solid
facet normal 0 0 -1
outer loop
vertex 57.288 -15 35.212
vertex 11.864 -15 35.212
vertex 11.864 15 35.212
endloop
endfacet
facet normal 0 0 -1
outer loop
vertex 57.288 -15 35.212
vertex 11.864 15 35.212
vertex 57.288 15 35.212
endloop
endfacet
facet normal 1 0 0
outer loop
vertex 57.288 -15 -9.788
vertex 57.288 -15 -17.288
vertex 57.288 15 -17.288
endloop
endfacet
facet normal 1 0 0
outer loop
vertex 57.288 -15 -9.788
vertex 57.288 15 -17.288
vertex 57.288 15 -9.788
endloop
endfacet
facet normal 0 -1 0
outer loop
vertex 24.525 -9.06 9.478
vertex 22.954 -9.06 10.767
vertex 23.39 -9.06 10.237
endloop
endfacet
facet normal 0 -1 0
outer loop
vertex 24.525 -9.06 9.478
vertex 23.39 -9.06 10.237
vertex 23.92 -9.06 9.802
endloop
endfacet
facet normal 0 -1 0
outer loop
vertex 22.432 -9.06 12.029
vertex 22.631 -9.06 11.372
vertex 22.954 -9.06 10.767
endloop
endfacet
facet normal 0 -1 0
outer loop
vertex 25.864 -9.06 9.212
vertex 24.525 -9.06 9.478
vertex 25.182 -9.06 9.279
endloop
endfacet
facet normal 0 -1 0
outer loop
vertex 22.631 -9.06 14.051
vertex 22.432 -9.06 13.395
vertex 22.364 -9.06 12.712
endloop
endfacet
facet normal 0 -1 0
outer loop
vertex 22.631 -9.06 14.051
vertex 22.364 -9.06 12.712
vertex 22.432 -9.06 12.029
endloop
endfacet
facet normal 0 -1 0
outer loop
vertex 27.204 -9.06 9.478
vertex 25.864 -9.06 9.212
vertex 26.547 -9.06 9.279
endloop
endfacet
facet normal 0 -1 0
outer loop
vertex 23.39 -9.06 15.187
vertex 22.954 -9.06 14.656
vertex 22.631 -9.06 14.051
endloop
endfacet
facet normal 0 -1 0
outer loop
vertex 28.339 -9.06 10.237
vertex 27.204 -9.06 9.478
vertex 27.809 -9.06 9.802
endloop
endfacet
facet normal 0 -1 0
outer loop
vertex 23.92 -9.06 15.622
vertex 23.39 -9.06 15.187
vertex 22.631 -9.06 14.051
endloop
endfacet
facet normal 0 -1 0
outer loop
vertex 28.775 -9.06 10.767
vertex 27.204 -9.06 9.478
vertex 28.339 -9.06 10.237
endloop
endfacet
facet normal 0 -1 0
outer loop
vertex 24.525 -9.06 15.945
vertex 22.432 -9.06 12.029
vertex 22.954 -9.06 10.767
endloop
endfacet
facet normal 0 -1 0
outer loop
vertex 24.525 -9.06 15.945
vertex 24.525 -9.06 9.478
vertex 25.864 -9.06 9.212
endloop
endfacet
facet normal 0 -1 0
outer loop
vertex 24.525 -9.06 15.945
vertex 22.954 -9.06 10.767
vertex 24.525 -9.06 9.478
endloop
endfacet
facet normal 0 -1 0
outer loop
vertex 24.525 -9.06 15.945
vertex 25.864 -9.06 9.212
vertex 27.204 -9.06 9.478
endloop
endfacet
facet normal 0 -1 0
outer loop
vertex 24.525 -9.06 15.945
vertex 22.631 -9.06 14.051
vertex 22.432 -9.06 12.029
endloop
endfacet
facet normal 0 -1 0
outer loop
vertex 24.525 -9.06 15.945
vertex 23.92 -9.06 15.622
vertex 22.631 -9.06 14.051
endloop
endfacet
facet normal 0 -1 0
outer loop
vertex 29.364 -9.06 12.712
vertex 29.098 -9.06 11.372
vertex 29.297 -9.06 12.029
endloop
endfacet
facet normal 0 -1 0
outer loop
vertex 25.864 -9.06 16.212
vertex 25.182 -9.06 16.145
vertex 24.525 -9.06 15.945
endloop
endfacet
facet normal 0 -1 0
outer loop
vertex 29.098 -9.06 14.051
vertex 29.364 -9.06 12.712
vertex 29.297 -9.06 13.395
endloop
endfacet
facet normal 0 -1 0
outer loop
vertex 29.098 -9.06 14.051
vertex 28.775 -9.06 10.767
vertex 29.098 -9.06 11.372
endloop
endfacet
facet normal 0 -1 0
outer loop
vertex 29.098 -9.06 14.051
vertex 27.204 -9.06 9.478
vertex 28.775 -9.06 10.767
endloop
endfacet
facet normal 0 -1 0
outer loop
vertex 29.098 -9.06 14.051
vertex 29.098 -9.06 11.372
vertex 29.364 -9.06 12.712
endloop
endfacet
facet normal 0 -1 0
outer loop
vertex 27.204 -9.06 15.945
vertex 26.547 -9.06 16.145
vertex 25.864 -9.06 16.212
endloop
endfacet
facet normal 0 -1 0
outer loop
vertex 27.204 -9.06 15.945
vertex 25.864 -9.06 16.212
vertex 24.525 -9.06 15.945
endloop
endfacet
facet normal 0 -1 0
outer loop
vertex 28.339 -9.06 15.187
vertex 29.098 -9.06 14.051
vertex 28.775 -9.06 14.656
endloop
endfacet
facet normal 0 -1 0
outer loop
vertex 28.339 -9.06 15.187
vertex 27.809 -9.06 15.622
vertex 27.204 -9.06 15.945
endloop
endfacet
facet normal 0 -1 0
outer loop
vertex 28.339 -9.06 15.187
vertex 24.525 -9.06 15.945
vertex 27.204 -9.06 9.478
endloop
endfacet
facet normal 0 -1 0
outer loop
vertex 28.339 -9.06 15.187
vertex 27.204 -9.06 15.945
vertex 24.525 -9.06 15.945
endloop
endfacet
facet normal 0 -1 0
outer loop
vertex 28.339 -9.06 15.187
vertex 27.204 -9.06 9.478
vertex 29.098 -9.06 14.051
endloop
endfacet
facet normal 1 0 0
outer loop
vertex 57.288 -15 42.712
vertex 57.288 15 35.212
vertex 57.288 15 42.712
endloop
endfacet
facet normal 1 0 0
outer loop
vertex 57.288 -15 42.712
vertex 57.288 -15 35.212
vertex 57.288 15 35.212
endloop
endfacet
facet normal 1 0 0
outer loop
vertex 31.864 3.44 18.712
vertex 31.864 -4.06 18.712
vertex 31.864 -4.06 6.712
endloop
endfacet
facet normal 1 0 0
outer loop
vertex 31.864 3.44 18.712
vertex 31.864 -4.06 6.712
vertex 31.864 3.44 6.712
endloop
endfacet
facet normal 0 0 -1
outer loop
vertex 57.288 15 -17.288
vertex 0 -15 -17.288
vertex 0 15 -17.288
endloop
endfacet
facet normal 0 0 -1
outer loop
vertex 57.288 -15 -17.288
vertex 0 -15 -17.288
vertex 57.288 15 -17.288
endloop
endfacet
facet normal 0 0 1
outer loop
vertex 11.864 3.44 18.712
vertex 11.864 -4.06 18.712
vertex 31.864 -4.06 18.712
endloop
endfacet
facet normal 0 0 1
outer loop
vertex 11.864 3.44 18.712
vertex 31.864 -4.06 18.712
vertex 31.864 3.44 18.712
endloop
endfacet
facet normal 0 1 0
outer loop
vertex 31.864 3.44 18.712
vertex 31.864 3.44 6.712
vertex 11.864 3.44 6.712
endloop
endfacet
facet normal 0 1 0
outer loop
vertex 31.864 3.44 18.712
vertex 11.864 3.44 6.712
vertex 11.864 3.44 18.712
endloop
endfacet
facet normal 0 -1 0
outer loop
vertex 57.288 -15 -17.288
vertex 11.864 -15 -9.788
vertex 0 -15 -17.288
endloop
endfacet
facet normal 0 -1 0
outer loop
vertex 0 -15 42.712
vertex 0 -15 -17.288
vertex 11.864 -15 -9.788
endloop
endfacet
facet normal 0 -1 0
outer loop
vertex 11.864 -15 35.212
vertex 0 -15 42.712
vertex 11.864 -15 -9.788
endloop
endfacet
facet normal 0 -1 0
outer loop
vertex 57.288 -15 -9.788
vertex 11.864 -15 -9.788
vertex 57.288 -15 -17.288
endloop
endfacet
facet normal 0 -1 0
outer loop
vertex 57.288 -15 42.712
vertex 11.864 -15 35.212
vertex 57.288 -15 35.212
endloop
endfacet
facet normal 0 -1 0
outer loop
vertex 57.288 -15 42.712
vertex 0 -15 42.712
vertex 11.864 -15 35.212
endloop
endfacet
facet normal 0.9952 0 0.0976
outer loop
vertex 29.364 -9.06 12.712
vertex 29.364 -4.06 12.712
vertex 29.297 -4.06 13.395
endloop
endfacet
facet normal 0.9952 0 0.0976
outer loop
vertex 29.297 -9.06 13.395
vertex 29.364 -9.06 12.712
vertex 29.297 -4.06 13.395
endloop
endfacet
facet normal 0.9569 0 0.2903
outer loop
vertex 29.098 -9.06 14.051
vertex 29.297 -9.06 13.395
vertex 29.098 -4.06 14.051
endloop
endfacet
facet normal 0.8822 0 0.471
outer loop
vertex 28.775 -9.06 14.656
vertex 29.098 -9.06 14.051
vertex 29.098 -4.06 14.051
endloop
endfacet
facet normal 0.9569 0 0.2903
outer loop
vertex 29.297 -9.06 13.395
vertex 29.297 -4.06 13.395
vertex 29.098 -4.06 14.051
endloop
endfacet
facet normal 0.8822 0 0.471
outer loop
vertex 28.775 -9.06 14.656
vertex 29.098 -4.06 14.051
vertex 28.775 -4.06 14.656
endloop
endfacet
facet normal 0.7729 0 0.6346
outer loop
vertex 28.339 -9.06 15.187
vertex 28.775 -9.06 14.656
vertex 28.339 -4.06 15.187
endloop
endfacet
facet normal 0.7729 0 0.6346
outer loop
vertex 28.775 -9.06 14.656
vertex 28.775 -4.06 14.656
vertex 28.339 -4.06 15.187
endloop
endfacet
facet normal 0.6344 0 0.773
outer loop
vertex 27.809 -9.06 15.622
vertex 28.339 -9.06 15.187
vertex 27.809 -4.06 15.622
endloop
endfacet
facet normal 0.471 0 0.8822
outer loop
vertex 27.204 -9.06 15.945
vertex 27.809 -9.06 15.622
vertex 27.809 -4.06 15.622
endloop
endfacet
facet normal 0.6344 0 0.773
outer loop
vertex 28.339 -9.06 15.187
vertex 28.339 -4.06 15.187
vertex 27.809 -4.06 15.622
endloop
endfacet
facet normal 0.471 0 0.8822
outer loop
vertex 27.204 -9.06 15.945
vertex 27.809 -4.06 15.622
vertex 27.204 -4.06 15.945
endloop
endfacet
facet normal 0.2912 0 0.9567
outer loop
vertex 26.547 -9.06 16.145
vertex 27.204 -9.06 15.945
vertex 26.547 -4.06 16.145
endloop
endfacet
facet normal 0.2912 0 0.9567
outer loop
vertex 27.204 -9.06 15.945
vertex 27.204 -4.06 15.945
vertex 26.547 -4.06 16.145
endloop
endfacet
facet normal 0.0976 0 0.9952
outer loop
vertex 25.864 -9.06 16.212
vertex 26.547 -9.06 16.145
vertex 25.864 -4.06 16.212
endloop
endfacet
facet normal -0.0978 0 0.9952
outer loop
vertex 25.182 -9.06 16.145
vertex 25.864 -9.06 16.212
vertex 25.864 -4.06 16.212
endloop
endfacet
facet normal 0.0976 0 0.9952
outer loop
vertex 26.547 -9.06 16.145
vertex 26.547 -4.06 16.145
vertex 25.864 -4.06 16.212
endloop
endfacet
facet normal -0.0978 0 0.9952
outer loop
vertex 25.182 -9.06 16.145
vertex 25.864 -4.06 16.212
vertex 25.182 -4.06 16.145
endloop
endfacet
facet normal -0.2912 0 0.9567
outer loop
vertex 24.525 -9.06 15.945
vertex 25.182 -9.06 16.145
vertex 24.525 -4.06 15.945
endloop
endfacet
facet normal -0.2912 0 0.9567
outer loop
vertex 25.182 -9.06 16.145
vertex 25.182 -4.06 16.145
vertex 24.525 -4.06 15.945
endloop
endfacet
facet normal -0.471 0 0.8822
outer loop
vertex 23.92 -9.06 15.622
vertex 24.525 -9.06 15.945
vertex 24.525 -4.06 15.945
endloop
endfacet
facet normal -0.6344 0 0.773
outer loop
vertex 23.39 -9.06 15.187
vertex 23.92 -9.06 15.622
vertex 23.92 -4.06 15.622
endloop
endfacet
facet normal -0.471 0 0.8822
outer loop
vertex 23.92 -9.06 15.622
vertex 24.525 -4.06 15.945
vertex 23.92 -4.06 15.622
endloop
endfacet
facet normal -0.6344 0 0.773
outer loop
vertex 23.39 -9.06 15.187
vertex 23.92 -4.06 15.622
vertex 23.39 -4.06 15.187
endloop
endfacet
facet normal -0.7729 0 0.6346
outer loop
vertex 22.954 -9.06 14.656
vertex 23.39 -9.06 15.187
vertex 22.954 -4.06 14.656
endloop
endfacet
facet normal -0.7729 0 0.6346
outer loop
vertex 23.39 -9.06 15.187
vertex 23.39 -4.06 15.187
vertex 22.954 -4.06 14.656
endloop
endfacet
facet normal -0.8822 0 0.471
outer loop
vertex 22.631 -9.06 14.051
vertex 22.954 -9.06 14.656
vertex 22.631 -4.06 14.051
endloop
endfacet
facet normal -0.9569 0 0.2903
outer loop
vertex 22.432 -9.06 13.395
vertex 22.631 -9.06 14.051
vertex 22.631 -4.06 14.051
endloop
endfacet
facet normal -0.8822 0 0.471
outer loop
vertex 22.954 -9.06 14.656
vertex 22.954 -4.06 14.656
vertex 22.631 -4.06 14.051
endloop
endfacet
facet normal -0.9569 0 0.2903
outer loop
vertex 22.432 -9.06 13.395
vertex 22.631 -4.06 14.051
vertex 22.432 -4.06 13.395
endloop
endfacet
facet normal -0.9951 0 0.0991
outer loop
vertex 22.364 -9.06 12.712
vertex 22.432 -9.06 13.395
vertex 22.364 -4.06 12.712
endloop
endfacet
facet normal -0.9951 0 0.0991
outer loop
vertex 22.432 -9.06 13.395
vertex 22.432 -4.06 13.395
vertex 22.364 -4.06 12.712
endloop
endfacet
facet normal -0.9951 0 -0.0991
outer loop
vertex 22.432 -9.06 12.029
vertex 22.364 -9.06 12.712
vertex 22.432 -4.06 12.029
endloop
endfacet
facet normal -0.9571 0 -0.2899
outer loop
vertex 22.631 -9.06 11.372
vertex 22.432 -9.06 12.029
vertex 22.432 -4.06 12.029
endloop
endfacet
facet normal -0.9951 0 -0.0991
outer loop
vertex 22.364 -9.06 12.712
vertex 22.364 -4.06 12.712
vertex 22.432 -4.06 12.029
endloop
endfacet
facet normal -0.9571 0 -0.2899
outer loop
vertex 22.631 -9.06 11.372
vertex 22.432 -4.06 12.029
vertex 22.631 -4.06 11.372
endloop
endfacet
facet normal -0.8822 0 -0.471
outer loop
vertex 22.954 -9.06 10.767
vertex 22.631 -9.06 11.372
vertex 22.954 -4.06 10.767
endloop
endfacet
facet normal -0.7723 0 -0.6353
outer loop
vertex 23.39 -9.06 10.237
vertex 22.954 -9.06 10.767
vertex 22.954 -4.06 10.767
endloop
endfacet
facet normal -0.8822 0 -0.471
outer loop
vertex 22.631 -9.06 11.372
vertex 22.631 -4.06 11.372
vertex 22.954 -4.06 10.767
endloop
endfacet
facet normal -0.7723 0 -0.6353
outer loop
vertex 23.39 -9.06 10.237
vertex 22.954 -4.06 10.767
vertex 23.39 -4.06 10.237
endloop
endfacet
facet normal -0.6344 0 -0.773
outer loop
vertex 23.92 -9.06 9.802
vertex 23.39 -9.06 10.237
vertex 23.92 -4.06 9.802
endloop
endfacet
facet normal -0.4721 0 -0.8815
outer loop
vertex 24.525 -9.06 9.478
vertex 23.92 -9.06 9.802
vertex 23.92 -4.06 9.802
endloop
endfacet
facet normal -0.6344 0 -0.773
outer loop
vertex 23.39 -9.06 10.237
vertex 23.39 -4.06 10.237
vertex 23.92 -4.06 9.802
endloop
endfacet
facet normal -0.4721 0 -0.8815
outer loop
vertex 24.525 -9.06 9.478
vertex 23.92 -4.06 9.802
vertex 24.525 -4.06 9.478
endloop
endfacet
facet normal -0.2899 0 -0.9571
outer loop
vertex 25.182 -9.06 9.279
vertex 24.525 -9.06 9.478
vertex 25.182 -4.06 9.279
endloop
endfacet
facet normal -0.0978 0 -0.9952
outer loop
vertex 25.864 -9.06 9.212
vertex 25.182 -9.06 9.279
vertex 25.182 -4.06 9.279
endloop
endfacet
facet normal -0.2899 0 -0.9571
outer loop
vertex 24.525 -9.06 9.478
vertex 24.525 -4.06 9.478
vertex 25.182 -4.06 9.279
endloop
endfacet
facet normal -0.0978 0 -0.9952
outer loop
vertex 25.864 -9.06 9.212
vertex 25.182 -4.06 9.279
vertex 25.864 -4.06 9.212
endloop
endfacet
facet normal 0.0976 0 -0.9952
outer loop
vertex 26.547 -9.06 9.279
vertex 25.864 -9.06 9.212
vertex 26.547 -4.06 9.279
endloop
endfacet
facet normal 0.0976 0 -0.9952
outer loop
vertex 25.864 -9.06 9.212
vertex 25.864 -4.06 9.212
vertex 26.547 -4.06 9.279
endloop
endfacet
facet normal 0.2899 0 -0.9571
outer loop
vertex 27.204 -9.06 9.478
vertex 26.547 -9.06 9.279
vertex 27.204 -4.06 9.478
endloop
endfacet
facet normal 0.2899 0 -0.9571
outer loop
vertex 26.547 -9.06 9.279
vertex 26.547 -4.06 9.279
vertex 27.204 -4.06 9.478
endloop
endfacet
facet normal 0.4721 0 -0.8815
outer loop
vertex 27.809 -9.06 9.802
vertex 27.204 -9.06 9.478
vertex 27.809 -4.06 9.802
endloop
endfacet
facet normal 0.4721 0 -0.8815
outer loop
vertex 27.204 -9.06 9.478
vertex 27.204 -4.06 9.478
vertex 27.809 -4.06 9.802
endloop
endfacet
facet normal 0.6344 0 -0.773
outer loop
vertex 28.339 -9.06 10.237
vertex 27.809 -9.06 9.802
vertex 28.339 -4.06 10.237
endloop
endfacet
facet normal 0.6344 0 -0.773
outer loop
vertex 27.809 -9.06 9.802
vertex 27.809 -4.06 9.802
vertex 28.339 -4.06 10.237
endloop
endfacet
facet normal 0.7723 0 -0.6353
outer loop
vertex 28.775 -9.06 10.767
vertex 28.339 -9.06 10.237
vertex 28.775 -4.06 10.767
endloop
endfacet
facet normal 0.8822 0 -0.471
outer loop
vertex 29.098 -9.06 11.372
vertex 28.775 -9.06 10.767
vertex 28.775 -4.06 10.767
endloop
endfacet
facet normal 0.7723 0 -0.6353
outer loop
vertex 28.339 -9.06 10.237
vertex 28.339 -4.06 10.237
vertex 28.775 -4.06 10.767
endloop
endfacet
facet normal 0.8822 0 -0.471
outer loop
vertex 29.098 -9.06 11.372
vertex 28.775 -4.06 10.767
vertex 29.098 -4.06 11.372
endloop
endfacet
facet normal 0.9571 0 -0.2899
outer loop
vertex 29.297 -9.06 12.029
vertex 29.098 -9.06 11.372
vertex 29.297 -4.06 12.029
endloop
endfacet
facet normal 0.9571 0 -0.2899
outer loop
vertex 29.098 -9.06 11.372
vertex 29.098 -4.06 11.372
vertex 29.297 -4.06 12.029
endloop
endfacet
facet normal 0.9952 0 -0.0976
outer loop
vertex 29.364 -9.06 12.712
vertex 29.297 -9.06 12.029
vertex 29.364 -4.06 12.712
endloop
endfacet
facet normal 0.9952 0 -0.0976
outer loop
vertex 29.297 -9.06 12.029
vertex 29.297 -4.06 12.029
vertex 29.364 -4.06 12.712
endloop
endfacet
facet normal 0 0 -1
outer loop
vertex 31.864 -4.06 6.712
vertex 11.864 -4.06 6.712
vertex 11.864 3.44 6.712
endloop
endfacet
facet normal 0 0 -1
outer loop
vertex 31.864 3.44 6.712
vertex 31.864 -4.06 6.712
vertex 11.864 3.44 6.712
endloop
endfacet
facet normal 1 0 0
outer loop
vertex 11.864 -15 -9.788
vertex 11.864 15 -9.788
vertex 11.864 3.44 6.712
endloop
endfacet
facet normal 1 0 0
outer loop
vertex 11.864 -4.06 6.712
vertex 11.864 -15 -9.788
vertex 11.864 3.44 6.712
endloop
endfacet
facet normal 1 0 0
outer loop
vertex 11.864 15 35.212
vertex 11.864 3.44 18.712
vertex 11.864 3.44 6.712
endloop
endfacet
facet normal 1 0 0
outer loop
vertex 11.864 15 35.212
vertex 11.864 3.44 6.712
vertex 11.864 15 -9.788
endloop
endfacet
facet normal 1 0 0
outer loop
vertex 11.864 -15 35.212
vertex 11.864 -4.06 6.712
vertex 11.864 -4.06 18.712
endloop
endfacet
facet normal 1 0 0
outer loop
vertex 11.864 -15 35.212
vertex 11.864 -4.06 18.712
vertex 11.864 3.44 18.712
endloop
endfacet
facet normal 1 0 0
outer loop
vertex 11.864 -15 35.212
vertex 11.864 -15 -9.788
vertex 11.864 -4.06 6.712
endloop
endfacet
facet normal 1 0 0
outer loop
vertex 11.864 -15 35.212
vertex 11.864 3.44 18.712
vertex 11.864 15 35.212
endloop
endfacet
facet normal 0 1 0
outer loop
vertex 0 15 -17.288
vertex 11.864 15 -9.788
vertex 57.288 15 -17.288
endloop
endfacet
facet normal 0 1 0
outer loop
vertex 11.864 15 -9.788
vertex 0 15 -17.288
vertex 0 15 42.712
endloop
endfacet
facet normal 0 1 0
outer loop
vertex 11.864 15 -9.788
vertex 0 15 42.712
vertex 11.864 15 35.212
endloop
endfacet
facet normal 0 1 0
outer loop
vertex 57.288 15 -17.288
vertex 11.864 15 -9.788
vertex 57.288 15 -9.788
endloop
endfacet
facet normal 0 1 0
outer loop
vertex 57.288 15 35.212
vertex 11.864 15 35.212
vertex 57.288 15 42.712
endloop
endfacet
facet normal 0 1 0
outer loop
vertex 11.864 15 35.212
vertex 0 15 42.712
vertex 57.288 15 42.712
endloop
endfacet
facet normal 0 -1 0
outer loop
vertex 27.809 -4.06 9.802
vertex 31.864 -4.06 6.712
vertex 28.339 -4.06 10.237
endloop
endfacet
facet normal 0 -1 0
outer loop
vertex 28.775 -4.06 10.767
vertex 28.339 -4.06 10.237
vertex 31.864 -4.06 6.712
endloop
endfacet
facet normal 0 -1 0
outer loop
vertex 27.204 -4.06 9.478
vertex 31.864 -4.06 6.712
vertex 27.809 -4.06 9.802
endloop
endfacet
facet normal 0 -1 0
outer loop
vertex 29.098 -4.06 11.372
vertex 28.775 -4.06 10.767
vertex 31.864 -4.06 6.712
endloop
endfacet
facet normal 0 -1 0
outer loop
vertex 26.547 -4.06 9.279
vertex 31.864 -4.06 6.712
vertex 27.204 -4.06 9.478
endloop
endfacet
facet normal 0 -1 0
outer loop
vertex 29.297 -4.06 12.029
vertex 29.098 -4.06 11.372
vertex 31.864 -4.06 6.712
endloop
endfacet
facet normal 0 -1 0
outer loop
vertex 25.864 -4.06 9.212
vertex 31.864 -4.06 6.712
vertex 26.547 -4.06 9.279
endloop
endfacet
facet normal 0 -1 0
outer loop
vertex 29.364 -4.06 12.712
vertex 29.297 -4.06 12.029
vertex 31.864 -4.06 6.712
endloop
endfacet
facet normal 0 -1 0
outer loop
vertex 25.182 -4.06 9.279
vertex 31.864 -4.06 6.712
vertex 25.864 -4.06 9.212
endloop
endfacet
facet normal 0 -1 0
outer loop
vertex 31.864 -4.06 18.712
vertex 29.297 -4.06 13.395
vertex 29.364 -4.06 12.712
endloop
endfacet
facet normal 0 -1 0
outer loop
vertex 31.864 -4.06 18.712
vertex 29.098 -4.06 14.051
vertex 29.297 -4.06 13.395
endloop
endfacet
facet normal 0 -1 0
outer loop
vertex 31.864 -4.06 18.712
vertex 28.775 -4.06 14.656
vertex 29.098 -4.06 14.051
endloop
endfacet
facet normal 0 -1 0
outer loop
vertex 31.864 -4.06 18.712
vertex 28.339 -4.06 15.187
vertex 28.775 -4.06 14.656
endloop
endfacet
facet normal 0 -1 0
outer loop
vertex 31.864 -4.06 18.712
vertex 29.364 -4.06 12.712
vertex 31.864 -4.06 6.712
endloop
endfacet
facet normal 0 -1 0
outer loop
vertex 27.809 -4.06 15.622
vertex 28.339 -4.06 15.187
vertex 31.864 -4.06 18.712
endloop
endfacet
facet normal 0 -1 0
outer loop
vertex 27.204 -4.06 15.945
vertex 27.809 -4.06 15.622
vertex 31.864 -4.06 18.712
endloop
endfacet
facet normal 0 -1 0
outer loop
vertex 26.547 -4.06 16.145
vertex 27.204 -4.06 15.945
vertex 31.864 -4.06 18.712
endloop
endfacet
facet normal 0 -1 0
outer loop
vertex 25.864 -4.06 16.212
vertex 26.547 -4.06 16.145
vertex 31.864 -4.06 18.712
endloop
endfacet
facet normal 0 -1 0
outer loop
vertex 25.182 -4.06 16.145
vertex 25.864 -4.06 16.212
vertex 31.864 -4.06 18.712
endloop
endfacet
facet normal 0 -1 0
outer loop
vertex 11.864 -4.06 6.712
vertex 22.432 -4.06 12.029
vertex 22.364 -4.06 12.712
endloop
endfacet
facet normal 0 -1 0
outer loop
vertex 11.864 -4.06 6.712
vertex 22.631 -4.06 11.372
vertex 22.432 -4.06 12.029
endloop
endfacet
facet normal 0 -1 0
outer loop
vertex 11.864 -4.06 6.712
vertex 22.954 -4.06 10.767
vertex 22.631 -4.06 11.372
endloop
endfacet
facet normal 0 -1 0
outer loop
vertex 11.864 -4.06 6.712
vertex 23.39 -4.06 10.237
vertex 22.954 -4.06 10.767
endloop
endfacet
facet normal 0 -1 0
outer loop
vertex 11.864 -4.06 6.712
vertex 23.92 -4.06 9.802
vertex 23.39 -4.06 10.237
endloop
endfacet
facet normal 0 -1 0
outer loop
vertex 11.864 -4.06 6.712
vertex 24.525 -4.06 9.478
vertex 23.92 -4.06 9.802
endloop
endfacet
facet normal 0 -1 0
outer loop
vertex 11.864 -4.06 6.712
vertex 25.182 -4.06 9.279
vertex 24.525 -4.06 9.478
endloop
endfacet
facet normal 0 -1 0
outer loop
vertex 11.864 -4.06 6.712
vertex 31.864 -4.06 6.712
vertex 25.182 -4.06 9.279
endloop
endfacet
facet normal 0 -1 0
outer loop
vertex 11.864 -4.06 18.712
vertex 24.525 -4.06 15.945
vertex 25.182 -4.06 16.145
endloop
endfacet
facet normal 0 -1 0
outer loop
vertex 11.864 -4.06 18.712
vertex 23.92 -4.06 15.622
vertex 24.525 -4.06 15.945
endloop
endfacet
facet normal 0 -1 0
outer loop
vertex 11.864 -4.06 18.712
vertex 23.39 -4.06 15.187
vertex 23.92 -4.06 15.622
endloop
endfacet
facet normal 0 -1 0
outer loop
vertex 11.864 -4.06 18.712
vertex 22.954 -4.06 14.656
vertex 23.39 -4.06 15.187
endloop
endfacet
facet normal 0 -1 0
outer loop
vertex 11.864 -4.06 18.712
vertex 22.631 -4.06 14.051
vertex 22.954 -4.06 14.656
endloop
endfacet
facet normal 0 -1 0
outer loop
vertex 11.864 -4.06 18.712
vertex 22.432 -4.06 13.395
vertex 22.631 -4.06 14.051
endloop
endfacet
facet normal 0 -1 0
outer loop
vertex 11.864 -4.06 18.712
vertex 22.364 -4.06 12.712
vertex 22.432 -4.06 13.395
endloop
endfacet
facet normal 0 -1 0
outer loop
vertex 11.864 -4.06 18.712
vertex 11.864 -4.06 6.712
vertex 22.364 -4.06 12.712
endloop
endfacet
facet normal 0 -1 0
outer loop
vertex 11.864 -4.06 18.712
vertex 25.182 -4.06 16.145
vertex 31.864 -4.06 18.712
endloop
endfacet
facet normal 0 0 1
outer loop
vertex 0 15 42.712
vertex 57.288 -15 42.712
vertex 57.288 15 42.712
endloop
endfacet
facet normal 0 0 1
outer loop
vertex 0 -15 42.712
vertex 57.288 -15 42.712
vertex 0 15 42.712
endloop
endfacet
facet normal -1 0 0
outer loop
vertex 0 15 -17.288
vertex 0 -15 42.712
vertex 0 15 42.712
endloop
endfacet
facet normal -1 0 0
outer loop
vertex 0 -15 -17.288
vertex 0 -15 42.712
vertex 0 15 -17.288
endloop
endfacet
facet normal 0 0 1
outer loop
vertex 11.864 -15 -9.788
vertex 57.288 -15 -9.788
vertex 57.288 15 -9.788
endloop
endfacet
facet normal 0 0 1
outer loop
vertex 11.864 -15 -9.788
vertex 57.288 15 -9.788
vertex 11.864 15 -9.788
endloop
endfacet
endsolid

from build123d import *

# Parameters (mm, degrees)
F1_DEPTH = 15
F2_W     = 7.5
F2_H     = 12
F3_DEPTH = 20
F4_R     = 3.5
F5_DEPTH = 5


with BuildPart() as f1:
    # F0 (on Front) → F1 (new body, symmetric)
    with BuildSketch(Plane.XZ):
        Polygon((0, 42.711864), (0, 0), (0, -17.288136), (57.288132, -17.288136), (57.288132, -9.788136), (11.864405, -9.788136), (11.864405, 35.211864), (57.288132, 35.211864), (57.288132, 42.711864), align=None)
    extrude(amount=F1_DEPTH, both=True)

    # F2 (on face) → F3 (join)
    with BuildSketch(Plane.YZ.offset(11.864405)):
        with Locations((-0.309874, 12.711864)):
            Rectangle(F2_W, F2_H)
    extrude(amount=F3_DEPTH)

    # F4 (on face) → F5 (join)
    with BuildSketch(Plane.XZ.offset(4.059874)):
        with Locations((25.864405, 12.711864)):
            Circle(F4_R)
    extrude(amount=F5_DEPTH)


solid = f1.part
